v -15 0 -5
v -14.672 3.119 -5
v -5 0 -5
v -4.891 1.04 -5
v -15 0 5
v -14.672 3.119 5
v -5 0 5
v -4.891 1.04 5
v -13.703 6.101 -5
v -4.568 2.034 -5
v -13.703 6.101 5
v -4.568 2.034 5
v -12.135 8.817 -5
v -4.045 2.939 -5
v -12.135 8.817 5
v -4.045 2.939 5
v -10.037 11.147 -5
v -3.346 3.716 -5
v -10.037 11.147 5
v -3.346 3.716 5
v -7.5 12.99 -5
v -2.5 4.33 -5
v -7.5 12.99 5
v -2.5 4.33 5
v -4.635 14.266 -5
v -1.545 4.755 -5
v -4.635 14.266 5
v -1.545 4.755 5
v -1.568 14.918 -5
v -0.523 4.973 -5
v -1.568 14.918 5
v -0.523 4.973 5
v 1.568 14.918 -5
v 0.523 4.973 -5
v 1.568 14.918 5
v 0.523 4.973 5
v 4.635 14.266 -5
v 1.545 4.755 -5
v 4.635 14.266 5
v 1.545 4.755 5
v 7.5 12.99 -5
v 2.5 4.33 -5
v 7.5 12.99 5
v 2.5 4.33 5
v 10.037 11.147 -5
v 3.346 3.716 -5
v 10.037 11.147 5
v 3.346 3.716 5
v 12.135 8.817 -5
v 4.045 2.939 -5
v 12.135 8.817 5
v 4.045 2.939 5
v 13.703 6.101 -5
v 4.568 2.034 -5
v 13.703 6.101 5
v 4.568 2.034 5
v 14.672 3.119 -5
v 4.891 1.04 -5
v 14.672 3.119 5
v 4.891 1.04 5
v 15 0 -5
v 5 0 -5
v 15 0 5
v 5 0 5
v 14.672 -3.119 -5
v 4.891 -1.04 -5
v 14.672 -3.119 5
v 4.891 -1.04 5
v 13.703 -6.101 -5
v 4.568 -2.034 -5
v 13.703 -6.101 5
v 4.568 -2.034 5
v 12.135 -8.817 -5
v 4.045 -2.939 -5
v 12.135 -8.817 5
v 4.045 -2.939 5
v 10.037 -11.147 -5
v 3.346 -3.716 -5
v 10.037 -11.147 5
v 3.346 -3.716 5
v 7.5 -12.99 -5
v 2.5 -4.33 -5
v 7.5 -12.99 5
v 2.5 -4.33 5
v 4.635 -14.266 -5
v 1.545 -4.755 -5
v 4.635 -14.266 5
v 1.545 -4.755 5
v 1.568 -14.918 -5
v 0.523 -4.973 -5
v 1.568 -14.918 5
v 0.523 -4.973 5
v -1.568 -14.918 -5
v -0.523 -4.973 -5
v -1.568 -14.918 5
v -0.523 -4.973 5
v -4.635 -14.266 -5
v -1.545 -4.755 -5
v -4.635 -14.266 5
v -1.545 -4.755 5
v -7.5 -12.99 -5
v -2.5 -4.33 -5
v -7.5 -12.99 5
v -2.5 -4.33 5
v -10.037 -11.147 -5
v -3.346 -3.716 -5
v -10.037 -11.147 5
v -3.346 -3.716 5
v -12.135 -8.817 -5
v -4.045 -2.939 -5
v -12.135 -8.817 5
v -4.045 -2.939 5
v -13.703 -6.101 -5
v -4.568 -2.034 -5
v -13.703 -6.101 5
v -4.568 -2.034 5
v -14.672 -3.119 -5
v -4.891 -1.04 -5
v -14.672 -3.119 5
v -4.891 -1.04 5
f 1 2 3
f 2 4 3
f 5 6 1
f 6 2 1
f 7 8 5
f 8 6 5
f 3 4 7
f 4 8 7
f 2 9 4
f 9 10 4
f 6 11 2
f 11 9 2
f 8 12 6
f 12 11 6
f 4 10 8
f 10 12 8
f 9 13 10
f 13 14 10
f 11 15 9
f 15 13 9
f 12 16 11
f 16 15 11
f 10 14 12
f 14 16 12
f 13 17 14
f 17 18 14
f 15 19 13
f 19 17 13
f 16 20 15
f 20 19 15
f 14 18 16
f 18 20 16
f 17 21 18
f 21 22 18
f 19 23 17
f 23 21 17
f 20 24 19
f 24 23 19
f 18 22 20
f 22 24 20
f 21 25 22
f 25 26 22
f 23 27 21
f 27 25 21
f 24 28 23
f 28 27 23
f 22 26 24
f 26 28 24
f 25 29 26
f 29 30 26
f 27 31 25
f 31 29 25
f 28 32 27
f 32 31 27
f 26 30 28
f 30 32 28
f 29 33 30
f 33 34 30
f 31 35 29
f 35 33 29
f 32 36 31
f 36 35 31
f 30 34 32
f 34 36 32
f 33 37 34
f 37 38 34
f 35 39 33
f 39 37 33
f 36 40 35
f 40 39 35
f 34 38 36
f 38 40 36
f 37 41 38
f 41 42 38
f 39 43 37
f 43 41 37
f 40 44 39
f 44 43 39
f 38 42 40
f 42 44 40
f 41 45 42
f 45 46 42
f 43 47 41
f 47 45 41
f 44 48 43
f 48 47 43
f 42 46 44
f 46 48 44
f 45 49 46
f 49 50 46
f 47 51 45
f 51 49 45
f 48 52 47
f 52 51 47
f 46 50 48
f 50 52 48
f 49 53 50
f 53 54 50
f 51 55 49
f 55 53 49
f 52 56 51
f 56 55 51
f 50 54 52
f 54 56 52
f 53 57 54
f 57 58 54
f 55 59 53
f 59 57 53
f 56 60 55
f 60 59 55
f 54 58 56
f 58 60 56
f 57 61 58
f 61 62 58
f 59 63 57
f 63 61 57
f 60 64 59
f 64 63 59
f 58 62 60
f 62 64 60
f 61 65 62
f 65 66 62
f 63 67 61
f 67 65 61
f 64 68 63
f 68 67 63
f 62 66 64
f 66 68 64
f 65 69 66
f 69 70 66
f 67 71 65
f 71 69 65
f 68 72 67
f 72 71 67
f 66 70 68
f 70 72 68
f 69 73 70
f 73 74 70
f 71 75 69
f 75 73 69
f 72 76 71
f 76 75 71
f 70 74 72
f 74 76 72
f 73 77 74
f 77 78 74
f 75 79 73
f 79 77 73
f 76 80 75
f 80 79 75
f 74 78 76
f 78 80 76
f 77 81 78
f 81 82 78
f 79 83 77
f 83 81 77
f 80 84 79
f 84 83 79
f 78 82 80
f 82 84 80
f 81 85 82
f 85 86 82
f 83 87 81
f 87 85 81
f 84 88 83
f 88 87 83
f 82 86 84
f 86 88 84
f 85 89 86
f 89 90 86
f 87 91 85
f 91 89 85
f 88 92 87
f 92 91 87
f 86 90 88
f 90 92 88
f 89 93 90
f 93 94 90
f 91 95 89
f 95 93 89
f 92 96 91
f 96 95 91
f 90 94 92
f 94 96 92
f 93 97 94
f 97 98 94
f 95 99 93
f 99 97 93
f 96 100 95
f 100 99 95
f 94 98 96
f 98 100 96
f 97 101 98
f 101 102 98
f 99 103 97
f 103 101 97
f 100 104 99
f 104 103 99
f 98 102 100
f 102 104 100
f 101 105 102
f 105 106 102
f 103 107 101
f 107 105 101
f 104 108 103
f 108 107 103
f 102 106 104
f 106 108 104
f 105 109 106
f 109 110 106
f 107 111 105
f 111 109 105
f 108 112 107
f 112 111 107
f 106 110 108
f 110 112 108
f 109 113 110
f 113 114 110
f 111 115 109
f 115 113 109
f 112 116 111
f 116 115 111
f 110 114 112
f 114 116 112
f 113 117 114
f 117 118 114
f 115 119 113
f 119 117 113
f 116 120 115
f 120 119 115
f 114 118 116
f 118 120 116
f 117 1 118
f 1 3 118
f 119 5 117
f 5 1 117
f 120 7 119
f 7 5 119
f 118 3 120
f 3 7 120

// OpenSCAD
/*
 * The rotate_extrude function wraps an object around the z-axis.
 * Parameters:
 *      convexity - specifies the maximum number of front sides (back sides) a ray intersecting the object might penetrate
 */
rotate_extrude(convexity = 10) {
    translate([10, 0, 0]) // Move object up 10 along the x-axis.
        square(size = 10, center = true);
}
